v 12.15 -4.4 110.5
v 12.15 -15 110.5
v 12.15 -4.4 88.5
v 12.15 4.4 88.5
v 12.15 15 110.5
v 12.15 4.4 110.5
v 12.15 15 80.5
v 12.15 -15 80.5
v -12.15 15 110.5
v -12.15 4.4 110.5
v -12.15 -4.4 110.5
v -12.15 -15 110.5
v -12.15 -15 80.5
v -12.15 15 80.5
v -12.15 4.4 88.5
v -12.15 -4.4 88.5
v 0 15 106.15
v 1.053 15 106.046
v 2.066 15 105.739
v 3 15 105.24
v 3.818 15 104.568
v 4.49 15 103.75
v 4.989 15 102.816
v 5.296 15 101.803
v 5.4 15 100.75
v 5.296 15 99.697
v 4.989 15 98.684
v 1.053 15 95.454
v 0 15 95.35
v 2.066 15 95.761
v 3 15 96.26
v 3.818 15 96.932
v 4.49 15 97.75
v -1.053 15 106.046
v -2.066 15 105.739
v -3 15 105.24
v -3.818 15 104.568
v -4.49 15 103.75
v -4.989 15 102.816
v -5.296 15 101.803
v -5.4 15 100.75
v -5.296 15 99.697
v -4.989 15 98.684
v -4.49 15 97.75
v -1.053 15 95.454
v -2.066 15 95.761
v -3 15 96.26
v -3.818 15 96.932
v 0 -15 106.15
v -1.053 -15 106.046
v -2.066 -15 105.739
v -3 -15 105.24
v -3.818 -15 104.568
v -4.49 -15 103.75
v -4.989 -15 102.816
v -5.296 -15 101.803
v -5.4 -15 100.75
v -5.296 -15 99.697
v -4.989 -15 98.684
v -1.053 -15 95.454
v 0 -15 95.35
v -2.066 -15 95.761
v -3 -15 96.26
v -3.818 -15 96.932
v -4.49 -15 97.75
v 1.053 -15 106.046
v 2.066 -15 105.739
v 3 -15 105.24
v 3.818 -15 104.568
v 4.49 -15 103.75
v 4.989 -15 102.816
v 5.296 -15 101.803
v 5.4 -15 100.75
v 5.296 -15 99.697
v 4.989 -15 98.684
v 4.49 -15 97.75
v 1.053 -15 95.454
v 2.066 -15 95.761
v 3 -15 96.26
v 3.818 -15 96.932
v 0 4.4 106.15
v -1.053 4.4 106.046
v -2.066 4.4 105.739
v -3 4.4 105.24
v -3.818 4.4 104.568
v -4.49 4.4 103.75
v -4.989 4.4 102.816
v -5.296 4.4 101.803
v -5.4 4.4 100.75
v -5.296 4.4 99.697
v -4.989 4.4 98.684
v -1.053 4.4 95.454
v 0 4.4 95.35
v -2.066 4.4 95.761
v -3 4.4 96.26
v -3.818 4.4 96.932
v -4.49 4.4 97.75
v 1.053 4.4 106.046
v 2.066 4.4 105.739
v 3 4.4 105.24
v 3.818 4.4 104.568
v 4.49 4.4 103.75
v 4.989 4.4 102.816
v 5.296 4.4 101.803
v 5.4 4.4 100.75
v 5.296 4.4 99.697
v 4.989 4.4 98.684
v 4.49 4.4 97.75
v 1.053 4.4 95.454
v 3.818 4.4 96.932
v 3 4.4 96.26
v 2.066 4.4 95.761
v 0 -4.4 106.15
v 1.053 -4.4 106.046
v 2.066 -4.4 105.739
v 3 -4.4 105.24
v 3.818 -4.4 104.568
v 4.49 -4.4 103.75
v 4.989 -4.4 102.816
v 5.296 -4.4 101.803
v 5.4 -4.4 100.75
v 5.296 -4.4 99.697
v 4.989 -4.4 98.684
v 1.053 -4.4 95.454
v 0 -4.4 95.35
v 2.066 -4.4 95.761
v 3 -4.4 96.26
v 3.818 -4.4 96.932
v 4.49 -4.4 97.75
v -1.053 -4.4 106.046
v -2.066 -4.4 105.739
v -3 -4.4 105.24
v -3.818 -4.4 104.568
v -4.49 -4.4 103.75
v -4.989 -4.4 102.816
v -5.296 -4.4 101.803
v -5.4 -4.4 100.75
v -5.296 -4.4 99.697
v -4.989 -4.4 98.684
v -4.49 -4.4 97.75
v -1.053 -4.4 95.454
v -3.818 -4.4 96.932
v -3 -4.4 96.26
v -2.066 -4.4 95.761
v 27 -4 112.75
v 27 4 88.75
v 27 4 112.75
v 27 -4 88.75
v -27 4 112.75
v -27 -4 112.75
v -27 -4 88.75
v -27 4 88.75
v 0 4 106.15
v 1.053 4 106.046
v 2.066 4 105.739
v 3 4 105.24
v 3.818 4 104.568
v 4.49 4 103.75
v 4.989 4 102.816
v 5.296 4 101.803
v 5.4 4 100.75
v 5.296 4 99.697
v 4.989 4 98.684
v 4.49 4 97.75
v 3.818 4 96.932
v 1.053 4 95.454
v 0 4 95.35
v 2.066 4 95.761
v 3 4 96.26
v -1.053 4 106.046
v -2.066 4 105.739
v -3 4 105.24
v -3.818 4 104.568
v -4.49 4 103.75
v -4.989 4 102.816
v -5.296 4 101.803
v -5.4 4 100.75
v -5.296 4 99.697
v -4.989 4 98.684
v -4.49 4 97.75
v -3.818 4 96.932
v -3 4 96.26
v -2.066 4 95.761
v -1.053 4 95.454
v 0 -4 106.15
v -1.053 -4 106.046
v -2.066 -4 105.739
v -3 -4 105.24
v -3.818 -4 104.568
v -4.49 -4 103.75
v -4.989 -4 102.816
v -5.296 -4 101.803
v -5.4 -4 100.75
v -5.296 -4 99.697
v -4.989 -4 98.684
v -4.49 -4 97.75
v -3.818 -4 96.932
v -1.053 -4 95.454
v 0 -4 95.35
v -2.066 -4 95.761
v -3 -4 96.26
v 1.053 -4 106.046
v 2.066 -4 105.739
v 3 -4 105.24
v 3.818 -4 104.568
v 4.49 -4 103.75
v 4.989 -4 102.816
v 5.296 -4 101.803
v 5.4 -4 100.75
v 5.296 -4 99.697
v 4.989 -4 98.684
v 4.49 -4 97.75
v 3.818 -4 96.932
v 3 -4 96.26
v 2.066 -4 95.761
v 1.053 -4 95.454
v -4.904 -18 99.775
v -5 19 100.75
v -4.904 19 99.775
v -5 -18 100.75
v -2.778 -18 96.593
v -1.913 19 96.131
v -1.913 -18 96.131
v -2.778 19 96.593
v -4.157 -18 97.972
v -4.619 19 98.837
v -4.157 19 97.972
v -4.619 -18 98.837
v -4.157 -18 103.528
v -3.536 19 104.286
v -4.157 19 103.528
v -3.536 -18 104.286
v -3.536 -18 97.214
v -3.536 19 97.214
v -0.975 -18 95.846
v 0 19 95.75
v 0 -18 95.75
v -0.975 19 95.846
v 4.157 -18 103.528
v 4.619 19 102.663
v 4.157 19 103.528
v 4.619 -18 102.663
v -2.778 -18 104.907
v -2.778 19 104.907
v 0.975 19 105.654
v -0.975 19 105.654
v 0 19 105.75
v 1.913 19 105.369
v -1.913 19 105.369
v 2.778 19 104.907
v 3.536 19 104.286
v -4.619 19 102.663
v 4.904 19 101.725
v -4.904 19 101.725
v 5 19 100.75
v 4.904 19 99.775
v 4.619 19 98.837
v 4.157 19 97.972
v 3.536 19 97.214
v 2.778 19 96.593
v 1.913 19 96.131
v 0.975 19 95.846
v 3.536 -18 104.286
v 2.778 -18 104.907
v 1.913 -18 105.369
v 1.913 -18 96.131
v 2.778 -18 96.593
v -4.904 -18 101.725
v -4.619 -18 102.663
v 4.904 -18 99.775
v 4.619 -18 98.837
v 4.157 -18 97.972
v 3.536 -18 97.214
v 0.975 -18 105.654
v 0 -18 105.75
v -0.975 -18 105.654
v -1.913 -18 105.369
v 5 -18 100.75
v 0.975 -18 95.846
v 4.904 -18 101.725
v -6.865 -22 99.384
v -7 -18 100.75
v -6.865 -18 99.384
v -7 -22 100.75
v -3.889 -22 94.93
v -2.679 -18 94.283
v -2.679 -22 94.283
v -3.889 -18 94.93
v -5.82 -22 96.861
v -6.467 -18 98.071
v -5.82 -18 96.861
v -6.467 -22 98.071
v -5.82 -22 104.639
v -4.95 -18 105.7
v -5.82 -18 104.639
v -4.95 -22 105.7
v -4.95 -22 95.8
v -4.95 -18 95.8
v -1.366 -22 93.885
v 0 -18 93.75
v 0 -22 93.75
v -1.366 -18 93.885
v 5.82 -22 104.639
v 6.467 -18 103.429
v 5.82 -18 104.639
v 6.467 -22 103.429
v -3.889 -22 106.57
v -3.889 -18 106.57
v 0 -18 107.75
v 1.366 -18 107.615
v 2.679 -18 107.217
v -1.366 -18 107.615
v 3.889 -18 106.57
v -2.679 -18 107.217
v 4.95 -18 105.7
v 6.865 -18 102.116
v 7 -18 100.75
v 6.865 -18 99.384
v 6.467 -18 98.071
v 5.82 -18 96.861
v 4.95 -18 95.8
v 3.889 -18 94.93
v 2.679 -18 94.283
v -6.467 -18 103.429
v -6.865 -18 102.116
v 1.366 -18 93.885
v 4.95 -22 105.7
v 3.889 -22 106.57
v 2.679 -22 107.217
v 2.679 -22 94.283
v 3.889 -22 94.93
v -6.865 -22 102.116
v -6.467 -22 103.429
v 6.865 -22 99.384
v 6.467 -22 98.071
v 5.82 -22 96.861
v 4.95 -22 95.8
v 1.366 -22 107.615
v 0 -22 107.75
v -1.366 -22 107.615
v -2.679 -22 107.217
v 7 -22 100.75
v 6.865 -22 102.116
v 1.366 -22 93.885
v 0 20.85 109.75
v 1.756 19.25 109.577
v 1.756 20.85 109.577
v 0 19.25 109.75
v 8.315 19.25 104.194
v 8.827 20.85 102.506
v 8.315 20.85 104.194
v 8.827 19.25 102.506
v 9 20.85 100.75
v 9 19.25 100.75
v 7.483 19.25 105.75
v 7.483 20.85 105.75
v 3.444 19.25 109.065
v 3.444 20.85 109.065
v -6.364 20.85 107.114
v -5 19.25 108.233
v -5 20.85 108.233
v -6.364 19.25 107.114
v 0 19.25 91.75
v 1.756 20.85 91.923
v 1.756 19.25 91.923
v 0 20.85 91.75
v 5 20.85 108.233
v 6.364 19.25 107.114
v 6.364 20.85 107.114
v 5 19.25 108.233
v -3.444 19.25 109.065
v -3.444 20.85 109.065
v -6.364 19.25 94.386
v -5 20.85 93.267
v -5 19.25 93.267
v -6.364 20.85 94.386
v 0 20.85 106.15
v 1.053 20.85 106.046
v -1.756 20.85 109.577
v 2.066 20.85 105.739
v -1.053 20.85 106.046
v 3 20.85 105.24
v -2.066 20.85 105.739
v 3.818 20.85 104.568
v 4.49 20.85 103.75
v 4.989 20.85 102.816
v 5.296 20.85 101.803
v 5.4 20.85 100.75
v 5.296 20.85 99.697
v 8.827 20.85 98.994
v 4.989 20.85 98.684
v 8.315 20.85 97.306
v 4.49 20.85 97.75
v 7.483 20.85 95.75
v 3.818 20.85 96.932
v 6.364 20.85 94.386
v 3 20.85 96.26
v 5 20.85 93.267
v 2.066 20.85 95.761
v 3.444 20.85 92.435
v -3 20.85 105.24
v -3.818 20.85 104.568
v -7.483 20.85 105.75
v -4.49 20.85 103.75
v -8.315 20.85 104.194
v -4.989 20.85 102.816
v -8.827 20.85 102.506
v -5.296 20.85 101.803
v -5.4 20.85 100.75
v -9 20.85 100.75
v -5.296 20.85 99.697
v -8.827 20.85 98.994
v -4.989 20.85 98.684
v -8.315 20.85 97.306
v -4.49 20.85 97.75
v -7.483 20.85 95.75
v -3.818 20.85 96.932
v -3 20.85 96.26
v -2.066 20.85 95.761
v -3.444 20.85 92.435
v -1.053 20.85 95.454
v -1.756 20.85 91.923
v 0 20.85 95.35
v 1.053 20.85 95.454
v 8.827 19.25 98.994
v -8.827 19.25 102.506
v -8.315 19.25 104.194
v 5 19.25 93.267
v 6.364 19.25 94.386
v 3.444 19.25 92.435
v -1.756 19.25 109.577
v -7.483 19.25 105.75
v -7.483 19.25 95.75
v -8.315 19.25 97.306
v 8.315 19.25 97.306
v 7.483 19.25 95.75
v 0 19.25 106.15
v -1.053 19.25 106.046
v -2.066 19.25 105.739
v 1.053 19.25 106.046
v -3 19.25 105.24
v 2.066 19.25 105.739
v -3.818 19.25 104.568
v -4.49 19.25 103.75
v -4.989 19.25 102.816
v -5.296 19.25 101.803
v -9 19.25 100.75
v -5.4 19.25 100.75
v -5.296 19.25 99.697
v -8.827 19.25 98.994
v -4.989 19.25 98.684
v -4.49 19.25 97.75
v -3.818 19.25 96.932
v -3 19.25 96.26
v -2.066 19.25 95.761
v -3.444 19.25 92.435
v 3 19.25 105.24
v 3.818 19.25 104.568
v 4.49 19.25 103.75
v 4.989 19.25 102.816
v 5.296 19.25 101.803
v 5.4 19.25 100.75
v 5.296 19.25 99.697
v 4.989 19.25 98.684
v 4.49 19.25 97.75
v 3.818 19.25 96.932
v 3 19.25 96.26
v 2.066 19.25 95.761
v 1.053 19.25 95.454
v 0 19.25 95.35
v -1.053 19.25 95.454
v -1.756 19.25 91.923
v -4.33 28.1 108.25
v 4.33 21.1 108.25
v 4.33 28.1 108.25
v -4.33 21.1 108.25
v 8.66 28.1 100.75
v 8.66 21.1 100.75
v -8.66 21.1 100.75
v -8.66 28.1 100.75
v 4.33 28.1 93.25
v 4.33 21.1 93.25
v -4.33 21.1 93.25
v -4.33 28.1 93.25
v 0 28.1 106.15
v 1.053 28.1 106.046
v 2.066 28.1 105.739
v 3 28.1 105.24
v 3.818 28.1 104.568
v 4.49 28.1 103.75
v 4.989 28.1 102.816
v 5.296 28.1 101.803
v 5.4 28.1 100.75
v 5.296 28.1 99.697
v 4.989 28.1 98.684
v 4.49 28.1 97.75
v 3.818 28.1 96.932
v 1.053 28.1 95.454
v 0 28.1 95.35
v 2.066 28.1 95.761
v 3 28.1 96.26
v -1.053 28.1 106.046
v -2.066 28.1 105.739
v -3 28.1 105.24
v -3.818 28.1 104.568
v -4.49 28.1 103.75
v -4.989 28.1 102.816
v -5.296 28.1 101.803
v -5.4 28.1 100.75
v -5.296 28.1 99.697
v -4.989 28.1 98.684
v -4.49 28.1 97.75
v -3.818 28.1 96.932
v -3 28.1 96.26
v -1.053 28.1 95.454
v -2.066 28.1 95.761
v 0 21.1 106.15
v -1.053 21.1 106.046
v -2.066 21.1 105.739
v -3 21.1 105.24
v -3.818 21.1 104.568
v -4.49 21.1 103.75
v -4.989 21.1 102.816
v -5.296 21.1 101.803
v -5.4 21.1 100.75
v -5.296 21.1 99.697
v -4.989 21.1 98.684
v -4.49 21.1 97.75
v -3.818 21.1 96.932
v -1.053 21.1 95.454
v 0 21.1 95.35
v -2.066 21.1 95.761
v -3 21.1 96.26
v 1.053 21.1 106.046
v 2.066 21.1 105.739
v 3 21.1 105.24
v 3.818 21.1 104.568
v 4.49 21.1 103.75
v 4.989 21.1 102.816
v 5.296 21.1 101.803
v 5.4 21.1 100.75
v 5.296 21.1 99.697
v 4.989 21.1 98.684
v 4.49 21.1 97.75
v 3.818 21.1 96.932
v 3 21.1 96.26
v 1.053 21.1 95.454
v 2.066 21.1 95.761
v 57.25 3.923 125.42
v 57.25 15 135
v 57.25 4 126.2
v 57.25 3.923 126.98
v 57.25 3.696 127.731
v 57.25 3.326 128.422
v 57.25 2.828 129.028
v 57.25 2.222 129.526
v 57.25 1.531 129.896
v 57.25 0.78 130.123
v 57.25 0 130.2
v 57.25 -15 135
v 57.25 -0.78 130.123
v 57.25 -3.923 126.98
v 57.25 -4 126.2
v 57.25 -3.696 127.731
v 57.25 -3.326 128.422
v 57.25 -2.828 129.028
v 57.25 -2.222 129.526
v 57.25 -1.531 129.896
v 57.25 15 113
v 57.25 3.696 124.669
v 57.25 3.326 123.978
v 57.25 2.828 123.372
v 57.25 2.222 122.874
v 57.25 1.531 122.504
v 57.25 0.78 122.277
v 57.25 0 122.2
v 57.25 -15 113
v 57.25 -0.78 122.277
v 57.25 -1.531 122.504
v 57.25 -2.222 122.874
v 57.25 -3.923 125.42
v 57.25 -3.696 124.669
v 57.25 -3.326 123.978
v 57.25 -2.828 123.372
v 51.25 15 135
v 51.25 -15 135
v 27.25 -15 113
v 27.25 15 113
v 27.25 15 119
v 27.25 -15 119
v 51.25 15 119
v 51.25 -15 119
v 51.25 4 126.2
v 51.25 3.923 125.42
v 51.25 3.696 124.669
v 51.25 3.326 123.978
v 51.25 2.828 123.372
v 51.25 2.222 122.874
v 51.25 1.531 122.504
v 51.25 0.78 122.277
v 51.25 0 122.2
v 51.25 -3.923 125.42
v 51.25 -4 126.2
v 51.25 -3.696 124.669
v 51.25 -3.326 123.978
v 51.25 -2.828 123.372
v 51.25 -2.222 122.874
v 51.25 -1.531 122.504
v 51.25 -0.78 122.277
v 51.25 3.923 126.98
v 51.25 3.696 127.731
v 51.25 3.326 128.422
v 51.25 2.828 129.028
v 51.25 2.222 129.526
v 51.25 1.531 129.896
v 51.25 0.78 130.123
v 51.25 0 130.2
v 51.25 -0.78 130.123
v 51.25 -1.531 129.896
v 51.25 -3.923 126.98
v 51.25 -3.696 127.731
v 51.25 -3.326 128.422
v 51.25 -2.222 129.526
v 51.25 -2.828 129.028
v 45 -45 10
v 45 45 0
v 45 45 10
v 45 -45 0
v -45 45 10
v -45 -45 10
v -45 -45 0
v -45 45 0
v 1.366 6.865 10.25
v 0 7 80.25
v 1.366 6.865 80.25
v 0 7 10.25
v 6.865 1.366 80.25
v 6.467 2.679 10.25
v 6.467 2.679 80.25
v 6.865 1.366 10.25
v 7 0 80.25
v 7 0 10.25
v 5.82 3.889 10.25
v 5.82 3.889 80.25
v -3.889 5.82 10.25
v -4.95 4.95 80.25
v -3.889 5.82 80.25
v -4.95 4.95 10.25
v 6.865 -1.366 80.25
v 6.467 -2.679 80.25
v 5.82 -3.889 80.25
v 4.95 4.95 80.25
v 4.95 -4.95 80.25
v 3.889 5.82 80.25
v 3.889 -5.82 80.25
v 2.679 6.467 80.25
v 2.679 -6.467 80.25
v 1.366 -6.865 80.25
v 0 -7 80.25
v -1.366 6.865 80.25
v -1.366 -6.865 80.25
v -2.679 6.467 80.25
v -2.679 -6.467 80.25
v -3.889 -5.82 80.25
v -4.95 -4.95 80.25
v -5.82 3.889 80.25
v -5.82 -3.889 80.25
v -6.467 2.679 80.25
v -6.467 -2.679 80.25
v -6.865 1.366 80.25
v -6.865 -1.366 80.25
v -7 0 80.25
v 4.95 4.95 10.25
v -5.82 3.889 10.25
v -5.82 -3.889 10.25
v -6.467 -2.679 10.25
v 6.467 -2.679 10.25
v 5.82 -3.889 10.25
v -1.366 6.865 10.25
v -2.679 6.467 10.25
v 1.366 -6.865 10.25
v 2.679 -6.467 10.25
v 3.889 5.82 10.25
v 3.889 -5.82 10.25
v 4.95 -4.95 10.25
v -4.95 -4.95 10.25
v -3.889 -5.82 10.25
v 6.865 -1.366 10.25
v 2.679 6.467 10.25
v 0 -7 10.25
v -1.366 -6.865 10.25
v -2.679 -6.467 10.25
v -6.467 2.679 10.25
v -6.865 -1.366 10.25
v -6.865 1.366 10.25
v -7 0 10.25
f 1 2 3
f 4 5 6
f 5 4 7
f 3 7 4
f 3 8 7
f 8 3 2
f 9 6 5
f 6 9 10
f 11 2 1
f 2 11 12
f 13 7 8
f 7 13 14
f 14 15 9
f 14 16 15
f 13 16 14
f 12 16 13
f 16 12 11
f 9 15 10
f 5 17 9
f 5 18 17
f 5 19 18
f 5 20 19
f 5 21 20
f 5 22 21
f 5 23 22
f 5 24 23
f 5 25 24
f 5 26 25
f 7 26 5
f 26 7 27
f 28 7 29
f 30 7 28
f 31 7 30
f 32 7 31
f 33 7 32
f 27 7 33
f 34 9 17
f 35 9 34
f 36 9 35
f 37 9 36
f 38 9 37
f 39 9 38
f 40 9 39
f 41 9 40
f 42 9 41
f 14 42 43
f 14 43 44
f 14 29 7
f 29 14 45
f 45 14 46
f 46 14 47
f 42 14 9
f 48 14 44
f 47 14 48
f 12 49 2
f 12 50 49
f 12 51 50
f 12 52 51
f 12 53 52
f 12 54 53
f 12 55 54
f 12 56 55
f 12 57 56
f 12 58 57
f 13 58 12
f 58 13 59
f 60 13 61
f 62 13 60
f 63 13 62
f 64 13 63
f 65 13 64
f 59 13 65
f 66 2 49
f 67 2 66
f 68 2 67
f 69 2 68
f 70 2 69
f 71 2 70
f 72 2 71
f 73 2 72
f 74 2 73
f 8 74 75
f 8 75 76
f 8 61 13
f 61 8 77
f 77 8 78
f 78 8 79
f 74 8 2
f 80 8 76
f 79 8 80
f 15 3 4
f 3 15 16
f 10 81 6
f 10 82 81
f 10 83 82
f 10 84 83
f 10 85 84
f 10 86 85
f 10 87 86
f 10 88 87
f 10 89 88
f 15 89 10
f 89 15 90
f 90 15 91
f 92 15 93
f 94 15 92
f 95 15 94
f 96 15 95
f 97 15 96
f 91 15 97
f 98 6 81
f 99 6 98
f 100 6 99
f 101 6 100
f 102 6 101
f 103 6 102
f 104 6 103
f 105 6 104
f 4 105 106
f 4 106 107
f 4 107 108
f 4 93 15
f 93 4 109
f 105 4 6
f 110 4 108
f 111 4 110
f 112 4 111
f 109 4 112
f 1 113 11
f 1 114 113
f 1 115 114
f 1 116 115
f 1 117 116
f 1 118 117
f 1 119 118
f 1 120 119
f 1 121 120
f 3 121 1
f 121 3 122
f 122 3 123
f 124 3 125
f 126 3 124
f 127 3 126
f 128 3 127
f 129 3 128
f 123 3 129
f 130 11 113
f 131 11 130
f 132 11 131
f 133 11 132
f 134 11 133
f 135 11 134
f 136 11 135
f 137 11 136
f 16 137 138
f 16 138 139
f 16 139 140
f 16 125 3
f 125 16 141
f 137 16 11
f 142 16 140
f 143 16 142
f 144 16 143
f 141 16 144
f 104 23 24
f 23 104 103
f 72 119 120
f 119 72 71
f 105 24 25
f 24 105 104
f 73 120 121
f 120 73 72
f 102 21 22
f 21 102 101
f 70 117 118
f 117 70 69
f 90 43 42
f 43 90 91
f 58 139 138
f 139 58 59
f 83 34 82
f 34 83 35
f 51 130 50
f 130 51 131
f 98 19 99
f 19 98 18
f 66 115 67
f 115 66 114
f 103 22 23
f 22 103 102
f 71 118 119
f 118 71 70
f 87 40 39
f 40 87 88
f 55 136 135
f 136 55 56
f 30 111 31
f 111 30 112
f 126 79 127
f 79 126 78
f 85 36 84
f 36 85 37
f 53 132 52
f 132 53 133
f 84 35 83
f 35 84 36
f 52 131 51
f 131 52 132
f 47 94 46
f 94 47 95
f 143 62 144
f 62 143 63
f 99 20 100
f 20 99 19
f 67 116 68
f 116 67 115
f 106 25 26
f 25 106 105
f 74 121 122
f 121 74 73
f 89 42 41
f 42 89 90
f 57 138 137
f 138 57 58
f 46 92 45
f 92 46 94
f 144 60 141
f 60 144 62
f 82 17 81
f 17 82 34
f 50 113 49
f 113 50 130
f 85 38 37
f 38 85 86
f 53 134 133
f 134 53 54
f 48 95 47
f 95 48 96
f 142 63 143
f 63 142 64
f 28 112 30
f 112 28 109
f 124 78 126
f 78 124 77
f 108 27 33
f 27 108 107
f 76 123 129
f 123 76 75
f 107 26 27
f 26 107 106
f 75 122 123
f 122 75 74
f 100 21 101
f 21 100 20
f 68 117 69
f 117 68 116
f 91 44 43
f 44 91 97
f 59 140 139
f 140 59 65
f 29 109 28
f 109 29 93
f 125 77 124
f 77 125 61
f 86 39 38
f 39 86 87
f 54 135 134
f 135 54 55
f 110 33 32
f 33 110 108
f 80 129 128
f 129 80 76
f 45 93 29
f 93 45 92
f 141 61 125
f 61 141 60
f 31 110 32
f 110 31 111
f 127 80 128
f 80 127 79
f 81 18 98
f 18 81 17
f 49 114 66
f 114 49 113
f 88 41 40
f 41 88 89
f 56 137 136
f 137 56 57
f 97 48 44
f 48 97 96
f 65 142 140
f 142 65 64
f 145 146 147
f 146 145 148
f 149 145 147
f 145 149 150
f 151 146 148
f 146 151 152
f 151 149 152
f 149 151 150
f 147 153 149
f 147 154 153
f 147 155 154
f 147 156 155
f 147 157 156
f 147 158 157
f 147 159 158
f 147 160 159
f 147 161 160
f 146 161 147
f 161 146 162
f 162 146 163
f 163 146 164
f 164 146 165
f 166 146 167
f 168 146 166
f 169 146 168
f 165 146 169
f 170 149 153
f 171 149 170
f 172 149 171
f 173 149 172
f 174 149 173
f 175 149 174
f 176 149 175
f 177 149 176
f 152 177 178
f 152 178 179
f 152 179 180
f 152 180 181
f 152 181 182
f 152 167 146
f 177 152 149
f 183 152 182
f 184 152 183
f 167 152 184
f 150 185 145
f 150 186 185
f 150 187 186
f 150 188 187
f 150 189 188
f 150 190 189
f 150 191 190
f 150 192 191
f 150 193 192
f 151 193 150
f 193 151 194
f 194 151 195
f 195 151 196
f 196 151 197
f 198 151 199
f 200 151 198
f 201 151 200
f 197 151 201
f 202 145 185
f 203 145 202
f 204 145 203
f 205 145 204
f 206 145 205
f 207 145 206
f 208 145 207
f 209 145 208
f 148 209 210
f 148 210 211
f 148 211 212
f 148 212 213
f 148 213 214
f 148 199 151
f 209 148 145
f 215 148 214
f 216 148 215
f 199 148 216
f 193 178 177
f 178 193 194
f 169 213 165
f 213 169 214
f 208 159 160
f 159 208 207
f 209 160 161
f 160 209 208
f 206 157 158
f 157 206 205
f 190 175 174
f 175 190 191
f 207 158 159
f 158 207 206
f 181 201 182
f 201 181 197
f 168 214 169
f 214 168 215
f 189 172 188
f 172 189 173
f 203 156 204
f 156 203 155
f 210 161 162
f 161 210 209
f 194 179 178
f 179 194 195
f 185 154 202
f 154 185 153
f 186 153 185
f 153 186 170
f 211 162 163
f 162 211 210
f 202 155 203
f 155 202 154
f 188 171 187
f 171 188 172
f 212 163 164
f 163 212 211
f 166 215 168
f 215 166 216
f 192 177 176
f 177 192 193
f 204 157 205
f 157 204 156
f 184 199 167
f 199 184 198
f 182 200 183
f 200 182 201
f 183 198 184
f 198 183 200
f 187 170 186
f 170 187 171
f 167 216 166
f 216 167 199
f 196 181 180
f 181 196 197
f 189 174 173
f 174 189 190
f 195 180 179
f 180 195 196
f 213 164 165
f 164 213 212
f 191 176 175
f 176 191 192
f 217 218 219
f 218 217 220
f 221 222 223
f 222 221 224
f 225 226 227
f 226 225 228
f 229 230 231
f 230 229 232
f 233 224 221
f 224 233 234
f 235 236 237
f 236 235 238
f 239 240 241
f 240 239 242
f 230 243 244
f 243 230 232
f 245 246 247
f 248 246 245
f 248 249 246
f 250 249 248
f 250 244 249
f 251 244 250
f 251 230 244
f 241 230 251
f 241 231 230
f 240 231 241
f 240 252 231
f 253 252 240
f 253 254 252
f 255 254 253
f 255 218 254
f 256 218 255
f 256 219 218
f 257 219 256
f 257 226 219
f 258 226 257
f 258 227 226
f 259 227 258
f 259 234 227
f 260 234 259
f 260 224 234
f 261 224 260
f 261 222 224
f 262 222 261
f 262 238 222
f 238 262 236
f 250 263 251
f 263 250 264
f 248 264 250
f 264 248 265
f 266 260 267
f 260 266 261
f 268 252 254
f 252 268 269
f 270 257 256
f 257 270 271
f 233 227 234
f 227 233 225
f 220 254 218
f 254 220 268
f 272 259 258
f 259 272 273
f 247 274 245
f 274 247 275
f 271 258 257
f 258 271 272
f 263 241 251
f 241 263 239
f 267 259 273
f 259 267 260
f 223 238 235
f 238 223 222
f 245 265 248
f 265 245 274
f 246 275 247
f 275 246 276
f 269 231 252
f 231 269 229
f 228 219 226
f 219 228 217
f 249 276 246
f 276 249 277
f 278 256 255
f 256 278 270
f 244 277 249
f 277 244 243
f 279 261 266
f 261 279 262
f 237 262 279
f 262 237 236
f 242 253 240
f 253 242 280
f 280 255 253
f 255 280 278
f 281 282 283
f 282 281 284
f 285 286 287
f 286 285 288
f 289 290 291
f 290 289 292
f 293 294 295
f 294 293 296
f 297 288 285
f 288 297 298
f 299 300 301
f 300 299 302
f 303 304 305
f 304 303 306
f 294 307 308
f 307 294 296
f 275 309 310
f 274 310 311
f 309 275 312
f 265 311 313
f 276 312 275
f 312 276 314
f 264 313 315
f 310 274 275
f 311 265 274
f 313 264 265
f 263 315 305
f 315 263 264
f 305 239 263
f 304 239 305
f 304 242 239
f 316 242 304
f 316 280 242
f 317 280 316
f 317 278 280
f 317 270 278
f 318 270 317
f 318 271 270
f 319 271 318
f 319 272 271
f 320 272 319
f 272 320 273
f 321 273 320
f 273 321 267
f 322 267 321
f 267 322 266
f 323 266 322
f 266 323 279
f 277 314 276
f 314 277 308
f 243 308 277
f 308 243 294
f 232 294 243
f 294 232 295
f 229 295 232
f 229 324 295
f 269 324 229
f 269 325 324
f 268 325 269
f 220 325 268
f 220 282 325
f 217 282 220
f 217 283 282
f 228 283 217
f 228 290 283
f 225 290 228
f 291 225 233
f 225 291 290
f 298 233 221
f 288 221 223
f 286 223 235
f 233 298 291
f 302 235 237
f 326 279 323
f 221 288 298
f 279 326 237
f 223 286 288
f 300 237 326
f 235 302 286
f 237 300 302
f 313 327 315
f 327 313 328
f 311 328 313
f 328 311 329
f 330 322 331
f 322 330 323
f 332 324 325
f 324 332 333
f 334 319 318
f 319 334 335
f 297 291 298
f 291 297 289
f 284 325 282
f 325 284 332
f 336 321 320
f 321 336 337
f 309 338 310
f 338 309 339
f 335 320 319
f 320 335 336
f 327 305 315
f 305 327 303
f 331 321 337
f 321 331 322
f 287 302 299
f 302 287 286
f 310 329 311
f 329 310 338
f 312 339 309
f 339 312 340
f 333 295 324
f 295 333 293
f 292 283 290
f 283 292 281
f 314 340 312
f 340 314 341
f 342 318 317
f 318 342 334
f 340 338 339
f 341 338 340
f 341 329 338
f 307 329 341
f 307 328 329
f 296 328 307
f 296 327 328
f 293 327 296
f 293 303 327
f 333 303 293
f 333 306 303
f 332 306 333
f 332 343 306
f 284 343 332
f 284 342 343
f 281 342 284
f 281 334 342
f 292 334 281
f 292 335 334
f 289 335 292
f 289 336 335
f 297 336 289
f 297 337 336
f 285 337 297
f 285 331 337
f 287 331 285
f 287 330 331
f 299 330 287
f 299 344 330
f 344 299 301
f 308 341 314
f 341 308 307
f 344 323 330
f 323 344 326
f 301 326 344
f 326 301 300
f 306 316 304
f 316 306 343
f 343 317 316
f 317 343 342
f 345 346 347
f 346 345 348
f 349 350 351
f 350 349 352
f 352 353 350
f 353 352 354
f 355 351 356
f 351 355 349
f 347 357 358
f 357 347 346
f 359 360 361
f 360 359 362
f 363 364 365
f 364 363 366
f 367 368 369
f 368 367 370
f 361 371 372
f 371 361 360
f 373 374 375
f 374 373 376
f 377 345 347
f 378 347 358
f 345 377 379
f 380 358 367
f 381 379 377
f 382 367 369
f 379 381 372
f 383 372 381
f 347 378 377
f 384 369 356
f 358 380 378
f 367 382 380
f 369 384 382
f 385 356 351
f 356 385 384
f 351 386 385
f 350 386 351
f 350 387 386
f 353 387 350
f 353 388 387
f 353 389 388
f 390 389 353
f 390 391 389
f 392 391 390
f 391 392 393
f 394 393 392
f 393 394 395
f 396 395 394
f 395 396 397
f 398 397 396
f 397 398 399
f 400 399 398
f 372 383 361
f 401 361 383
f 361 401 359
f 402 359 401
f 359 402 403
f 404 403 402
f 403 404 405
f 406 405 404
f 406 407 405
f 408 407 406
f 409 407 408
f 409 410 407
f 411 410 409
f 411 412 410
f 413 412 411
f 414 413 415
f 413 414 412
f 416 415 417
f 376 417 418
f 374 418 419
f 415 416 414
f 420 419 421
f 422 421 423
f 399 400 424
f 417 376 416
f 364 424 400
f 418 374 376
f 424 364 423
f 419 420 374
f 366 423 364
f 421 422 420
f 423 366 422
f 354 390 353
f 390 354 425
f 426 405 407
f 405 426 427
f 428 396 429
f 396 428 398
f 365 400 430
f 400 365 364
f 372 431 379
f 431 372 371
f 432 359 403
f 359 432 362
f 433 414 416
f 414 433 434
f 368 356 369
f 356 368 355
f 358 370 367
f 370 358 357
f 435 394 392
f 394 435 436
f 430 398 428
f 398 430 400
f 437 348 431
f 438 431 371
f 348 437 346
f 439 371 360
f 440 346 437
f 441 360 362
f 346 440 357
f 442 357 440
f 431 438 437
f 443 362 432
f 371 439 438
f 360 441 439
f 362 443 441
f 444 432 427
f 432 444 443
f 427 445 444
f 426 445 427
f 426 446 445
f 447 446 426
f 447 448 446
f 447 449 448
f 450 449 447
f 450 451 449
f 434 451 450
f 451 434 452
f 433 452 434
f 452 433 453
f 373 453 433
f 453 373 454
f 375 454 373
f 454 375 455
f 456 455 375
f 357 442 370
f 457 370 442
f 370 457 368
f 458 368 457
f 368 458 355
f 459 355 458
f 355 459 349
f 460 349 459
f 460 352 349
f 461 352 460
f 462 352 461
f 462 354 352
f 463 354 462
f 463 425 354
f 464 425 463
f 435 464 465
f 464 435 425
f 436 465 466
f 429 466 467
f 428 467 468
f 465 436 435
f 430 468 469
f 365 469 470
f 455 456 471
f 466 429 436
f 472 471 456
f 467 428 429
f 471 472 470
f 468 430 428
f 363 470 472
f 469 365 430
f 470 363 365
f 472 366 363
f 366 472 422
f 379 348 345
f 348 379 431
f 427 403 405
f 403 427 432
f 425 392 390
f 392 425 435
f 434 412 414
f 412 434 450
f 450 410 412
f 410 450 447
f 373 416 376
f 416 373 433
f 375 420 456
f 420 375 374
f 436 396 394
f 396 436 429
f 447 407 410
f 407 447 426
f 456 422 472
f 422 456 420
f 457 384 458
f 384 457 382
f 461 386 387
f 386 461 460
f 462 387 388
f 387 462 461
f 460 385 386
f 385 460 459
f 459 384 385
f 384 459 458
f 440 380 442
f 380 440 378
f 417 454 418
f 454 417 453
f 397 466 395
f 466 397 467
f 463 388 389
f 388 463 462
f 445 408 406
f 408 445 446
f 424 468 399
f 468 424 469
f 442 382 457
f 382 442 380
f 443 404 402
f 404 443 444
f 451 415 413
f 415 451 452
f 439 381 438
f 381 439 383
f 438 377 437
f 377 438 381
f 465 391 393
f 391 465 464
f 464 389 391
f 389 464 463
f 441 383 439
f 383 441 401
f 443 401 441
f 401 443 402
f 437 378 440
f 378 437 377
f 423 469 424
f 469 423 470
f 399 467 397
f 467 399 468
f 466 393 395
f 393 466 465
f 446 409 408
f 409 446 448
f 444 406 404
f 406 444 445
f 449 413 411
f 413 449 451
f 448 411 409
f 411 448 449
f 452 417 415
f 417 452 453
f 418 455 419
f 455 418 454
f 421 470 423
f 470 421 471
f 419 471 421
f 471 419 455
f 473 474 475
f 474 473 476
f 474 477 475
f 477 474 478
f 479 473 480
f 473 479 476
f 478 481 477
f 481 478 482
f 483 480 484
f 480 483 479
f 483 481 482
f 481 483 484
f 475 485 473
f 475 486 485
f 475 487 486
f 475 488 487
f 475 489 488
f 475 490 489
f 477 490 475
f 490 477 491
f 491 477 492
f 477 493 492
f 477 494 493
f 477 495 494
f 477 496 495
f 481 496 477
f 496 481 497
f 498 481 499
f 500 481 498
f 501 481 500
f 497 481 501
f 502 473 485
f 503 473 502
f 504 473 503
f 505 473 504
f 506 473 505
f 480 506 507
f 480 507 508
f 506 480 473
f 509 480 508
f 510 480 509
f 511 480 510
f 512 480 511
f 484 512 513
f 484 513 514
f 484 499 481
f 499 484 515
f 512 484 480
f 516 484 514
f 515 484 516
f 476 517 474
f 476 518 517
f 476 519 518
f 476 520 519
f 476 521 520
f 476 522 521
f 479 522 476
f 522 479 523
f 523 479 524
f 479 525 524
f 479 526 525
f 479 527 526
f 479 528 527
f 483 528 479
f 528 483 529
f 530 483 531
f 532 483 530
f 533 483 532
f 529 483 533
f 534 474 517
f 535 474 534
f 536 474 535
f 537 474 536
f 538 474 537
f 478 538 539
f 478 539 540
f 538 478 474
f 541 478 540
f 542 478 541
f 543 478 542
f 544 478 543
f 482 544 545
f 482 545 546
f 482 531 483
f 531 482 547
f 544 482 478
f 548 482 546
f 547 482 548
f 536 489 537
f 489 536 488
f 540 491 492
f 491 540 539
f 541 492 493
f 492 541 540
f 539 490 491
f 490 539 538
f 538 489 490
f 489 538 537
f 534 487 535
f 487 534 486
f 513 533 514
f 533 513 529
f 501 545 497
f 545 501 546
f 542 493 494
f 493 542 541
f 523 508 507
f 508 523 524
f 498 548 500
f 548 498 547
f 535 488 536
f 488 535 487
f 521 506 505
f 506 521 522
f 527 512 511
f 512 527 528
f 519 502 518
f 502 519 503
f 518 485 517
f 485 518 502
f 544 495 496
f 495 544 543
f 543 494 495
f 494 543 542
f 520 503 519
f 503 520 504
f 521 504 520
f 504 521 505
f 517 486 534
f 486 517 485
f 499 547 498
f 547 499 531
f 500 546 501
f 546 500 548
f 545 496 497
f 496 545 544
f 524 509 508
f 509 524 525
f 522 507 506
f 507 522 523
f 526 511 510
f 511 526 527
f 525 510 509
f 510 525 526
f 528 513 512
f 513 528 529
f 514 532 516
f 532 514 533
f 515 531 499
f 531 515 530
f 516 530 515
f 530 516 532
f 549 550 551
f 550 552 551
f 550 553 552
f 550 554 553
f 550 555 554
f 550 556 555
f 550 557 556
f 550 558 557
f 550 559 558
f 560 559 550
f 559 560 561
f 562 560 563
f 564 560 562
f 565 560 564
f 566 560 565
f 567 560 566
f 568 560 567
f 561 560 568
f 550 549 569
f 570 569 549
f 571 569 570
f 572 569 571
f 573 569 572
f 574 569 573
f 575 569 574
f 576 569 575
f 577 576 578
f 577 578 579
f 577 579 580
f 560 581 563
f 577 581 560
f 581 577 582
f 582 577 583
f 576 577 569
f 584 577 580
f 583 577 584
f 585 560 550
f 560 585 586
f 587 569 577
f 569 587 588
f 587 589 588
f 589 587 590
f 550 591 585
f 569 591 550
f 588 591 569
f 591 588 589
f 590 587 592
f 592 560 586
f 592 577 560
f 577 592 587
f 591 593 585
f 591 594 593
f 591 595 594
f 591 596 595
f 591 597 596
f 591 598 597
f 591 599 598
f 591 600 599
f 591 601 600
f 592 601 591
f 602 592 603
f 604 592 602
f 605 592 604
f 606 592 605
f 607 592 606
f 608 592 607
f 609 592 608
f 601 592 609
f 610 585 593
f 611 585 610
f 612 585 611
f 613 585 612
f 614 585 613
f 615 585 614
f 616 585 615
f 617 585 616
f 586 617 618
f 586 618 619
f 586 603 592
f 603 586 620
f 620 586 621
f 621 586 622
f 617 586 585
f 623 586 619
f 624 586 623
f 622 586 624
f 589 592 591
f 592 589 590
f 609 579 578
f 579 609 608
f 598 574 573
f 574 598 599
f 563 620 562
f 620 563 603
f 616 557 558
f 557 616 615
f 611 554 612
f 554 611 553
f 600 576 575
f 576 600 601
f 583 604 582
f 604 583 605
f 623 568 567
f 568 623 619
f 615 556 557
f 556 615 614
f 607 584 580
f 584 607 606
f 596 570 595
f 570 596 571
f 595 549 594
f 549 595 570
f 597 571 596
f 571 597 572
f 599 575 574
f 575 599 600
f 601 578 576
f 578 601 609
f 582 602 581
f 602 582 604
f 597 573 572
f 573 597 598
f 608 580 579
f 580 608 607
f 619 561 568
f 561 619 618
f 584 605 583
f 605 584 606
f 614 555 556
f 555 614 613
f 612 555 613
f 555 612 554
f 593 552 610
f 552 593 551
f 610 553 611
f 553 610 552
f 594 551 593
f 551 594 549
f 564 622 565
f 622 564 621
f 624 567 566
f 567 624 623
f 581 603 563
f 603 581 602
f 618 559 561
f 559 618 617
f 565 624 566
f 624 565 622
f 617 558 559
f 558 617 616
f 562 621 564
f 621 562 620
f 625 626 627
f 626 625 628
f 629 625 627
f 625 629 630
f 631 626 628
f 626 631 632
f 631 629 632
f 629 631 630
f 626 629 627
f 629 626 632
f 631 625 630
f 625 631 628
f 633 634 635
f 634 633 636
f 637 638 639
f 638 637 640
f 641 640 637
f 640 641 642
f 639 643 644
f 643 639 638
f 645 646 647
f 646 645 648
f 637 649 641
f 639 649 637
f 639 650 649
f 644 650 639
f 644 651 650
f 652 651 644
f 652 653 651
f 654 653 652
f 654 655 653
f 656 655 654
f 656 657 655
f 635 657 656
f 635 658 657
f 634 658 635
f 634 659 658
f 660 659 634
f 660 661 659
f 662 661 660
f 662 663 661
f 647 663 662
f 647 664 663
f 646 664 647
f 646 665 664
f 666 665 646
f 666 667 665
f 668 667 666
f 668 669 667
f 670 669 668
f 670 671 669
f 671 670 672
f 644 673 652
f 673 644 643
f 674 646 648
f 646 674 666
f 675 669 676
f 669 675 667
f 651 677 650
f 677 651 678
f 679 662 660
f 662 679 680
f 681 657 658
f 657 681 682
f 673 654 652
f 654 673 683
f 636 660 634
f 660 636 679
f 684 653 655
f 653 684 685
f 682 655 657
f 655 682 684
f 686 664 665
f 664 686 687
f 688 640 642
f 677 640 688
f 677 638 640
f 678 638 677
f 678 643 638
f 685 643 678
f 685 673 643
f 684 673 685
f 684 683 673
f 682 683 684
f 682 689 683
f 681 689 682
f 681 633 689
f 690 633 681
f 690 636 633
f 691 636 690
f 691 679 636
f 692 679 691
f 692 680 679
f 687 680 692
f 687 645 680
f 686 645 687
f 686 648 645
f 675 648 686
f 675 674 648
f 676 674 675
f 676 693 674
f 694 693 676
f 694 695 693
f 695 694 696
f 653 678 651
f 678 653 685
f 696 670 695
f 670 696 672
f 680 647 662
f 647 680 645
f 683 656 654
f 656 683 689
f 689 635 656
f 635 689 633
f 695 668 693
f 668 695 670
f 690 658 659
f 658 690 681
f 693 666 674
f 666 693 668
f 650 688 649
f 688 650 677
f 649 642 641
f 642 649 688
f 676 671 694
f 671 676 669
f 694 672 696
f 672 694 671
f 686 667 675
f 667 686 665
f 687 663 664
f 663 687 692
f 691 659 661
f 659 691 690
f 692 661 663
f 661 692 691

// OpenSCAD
$fn = 32;

// ------------------------------------------------------------------------
// Lamp arm: column d14 x 70 mm, arm 54 mm
// Every part is its own module, assembly() places every instance.
// ------------------------------------------------------------------------

// --- part 1 ---
module lamp_base() {
  difference() {
    translate([-45, -45, 0]) cube([90, 90, 10]);
  }
}

// --- part 2 ---
module lamp_column() {
  cylinder(h = 70, d = 14);
}

// --- part 3 ---
module head_fork() {
  difference() {
    translate([-12.15, -15, 0]) cube([24.3, 30, 30]);
    translate([-13.15, -4.4, 8]) cube([26.3, 8.8, 23]);
    translate([0, 0, 20.25]) rotate([90, 0, 0]) cylinder(h = 32, d = 10.8, center = true);
  }
}

// --- part 4 ---
module lamp_arm() {
  difference() {
    translate([-27, -4, 0]) cube([54, 8, 24]);
    translate([0, 0, 12]) rotate([90, 0, 0]) cylinder(h = 10, d = 10.8, center = true);
  }
}

// --- part 5 ---
module arm_pin() {
  rotate([0, 90, 0]) cylinder(h = 38, d = 10, center = true);
  translate([-22, 0, 0]) rotate([0, 90, 0]) cylinder(h = 4, d = 14);
}

// --- part 6 ---
module arm_washer() {
  difference() {
      translate([0, 0, 0]) cylinder(h = 1.6, d = 18);
      translate([0, 0, -1]) cylinder(h = 3.6, d = 10.8);
    }
}

// --- part 7 ---
module arm_nut() {
  difference() {
    linear_extrude(height = 7) polygon(points = [[8.66, 0], [4.33, 7.5], [-4.33, 7.5], [-8.66, 0], [-4.33, -7.5], [4.33, -7.5]]);
    translate([0, 0, -1]) cylinder(h = 9, d = 10.8);
  }
}

// --- part 8 ---
module shade_bracket() {
  difference() {
    translate([-15, -15, 0]) cube([30, 30, 22]);
    translate([-16, -16, 6]) cube([25, 32, 17]);
    translate([12, 0, 13.2]) rotate([0, 90, 0]) cylinder(h = 8, d = 8, center = true);
  }
}

// --- assembly ---
module assembly() {
  color([0.80, 0.24, 0.20]) translate([0, 0, 0]) rotate([0, 0, 0]) lamp_base();
  color([0.20, 0.45, 0.75]) translate([0, 0, 10.25]) rotate([0, 0, 0]) lamp_column();
  color([0.25, 0.62, 0.32]) translate([0, 0, 80.5]) rotate([0, 0, 0]) head_fork();
  color([0.92, 0.70, 0.18]) translate([0, 0, 88.75]) rotate([0, 0, 0]) lamp_arm();
  color([0.58, 0.35, 0.70]) translate([0, 0, 100.75]) rotate([0, 0, 90]) arm_pin();
  color([0.16, 0.66, 0.66]) translate([0, 20.85, 100.75]) rotate([90, 0, 0]) arm_washer();
  color([0.85, 0.48, 0.18]) translate([0, 28.1, 100.75]) rotate([90, 0, 0]) arm_nut();
  color([0.55, 0.60, 0.65]) translate([42.25, 0, 113]) rotate([0, 0, 0]) shade_bracket();
}

assembly();
